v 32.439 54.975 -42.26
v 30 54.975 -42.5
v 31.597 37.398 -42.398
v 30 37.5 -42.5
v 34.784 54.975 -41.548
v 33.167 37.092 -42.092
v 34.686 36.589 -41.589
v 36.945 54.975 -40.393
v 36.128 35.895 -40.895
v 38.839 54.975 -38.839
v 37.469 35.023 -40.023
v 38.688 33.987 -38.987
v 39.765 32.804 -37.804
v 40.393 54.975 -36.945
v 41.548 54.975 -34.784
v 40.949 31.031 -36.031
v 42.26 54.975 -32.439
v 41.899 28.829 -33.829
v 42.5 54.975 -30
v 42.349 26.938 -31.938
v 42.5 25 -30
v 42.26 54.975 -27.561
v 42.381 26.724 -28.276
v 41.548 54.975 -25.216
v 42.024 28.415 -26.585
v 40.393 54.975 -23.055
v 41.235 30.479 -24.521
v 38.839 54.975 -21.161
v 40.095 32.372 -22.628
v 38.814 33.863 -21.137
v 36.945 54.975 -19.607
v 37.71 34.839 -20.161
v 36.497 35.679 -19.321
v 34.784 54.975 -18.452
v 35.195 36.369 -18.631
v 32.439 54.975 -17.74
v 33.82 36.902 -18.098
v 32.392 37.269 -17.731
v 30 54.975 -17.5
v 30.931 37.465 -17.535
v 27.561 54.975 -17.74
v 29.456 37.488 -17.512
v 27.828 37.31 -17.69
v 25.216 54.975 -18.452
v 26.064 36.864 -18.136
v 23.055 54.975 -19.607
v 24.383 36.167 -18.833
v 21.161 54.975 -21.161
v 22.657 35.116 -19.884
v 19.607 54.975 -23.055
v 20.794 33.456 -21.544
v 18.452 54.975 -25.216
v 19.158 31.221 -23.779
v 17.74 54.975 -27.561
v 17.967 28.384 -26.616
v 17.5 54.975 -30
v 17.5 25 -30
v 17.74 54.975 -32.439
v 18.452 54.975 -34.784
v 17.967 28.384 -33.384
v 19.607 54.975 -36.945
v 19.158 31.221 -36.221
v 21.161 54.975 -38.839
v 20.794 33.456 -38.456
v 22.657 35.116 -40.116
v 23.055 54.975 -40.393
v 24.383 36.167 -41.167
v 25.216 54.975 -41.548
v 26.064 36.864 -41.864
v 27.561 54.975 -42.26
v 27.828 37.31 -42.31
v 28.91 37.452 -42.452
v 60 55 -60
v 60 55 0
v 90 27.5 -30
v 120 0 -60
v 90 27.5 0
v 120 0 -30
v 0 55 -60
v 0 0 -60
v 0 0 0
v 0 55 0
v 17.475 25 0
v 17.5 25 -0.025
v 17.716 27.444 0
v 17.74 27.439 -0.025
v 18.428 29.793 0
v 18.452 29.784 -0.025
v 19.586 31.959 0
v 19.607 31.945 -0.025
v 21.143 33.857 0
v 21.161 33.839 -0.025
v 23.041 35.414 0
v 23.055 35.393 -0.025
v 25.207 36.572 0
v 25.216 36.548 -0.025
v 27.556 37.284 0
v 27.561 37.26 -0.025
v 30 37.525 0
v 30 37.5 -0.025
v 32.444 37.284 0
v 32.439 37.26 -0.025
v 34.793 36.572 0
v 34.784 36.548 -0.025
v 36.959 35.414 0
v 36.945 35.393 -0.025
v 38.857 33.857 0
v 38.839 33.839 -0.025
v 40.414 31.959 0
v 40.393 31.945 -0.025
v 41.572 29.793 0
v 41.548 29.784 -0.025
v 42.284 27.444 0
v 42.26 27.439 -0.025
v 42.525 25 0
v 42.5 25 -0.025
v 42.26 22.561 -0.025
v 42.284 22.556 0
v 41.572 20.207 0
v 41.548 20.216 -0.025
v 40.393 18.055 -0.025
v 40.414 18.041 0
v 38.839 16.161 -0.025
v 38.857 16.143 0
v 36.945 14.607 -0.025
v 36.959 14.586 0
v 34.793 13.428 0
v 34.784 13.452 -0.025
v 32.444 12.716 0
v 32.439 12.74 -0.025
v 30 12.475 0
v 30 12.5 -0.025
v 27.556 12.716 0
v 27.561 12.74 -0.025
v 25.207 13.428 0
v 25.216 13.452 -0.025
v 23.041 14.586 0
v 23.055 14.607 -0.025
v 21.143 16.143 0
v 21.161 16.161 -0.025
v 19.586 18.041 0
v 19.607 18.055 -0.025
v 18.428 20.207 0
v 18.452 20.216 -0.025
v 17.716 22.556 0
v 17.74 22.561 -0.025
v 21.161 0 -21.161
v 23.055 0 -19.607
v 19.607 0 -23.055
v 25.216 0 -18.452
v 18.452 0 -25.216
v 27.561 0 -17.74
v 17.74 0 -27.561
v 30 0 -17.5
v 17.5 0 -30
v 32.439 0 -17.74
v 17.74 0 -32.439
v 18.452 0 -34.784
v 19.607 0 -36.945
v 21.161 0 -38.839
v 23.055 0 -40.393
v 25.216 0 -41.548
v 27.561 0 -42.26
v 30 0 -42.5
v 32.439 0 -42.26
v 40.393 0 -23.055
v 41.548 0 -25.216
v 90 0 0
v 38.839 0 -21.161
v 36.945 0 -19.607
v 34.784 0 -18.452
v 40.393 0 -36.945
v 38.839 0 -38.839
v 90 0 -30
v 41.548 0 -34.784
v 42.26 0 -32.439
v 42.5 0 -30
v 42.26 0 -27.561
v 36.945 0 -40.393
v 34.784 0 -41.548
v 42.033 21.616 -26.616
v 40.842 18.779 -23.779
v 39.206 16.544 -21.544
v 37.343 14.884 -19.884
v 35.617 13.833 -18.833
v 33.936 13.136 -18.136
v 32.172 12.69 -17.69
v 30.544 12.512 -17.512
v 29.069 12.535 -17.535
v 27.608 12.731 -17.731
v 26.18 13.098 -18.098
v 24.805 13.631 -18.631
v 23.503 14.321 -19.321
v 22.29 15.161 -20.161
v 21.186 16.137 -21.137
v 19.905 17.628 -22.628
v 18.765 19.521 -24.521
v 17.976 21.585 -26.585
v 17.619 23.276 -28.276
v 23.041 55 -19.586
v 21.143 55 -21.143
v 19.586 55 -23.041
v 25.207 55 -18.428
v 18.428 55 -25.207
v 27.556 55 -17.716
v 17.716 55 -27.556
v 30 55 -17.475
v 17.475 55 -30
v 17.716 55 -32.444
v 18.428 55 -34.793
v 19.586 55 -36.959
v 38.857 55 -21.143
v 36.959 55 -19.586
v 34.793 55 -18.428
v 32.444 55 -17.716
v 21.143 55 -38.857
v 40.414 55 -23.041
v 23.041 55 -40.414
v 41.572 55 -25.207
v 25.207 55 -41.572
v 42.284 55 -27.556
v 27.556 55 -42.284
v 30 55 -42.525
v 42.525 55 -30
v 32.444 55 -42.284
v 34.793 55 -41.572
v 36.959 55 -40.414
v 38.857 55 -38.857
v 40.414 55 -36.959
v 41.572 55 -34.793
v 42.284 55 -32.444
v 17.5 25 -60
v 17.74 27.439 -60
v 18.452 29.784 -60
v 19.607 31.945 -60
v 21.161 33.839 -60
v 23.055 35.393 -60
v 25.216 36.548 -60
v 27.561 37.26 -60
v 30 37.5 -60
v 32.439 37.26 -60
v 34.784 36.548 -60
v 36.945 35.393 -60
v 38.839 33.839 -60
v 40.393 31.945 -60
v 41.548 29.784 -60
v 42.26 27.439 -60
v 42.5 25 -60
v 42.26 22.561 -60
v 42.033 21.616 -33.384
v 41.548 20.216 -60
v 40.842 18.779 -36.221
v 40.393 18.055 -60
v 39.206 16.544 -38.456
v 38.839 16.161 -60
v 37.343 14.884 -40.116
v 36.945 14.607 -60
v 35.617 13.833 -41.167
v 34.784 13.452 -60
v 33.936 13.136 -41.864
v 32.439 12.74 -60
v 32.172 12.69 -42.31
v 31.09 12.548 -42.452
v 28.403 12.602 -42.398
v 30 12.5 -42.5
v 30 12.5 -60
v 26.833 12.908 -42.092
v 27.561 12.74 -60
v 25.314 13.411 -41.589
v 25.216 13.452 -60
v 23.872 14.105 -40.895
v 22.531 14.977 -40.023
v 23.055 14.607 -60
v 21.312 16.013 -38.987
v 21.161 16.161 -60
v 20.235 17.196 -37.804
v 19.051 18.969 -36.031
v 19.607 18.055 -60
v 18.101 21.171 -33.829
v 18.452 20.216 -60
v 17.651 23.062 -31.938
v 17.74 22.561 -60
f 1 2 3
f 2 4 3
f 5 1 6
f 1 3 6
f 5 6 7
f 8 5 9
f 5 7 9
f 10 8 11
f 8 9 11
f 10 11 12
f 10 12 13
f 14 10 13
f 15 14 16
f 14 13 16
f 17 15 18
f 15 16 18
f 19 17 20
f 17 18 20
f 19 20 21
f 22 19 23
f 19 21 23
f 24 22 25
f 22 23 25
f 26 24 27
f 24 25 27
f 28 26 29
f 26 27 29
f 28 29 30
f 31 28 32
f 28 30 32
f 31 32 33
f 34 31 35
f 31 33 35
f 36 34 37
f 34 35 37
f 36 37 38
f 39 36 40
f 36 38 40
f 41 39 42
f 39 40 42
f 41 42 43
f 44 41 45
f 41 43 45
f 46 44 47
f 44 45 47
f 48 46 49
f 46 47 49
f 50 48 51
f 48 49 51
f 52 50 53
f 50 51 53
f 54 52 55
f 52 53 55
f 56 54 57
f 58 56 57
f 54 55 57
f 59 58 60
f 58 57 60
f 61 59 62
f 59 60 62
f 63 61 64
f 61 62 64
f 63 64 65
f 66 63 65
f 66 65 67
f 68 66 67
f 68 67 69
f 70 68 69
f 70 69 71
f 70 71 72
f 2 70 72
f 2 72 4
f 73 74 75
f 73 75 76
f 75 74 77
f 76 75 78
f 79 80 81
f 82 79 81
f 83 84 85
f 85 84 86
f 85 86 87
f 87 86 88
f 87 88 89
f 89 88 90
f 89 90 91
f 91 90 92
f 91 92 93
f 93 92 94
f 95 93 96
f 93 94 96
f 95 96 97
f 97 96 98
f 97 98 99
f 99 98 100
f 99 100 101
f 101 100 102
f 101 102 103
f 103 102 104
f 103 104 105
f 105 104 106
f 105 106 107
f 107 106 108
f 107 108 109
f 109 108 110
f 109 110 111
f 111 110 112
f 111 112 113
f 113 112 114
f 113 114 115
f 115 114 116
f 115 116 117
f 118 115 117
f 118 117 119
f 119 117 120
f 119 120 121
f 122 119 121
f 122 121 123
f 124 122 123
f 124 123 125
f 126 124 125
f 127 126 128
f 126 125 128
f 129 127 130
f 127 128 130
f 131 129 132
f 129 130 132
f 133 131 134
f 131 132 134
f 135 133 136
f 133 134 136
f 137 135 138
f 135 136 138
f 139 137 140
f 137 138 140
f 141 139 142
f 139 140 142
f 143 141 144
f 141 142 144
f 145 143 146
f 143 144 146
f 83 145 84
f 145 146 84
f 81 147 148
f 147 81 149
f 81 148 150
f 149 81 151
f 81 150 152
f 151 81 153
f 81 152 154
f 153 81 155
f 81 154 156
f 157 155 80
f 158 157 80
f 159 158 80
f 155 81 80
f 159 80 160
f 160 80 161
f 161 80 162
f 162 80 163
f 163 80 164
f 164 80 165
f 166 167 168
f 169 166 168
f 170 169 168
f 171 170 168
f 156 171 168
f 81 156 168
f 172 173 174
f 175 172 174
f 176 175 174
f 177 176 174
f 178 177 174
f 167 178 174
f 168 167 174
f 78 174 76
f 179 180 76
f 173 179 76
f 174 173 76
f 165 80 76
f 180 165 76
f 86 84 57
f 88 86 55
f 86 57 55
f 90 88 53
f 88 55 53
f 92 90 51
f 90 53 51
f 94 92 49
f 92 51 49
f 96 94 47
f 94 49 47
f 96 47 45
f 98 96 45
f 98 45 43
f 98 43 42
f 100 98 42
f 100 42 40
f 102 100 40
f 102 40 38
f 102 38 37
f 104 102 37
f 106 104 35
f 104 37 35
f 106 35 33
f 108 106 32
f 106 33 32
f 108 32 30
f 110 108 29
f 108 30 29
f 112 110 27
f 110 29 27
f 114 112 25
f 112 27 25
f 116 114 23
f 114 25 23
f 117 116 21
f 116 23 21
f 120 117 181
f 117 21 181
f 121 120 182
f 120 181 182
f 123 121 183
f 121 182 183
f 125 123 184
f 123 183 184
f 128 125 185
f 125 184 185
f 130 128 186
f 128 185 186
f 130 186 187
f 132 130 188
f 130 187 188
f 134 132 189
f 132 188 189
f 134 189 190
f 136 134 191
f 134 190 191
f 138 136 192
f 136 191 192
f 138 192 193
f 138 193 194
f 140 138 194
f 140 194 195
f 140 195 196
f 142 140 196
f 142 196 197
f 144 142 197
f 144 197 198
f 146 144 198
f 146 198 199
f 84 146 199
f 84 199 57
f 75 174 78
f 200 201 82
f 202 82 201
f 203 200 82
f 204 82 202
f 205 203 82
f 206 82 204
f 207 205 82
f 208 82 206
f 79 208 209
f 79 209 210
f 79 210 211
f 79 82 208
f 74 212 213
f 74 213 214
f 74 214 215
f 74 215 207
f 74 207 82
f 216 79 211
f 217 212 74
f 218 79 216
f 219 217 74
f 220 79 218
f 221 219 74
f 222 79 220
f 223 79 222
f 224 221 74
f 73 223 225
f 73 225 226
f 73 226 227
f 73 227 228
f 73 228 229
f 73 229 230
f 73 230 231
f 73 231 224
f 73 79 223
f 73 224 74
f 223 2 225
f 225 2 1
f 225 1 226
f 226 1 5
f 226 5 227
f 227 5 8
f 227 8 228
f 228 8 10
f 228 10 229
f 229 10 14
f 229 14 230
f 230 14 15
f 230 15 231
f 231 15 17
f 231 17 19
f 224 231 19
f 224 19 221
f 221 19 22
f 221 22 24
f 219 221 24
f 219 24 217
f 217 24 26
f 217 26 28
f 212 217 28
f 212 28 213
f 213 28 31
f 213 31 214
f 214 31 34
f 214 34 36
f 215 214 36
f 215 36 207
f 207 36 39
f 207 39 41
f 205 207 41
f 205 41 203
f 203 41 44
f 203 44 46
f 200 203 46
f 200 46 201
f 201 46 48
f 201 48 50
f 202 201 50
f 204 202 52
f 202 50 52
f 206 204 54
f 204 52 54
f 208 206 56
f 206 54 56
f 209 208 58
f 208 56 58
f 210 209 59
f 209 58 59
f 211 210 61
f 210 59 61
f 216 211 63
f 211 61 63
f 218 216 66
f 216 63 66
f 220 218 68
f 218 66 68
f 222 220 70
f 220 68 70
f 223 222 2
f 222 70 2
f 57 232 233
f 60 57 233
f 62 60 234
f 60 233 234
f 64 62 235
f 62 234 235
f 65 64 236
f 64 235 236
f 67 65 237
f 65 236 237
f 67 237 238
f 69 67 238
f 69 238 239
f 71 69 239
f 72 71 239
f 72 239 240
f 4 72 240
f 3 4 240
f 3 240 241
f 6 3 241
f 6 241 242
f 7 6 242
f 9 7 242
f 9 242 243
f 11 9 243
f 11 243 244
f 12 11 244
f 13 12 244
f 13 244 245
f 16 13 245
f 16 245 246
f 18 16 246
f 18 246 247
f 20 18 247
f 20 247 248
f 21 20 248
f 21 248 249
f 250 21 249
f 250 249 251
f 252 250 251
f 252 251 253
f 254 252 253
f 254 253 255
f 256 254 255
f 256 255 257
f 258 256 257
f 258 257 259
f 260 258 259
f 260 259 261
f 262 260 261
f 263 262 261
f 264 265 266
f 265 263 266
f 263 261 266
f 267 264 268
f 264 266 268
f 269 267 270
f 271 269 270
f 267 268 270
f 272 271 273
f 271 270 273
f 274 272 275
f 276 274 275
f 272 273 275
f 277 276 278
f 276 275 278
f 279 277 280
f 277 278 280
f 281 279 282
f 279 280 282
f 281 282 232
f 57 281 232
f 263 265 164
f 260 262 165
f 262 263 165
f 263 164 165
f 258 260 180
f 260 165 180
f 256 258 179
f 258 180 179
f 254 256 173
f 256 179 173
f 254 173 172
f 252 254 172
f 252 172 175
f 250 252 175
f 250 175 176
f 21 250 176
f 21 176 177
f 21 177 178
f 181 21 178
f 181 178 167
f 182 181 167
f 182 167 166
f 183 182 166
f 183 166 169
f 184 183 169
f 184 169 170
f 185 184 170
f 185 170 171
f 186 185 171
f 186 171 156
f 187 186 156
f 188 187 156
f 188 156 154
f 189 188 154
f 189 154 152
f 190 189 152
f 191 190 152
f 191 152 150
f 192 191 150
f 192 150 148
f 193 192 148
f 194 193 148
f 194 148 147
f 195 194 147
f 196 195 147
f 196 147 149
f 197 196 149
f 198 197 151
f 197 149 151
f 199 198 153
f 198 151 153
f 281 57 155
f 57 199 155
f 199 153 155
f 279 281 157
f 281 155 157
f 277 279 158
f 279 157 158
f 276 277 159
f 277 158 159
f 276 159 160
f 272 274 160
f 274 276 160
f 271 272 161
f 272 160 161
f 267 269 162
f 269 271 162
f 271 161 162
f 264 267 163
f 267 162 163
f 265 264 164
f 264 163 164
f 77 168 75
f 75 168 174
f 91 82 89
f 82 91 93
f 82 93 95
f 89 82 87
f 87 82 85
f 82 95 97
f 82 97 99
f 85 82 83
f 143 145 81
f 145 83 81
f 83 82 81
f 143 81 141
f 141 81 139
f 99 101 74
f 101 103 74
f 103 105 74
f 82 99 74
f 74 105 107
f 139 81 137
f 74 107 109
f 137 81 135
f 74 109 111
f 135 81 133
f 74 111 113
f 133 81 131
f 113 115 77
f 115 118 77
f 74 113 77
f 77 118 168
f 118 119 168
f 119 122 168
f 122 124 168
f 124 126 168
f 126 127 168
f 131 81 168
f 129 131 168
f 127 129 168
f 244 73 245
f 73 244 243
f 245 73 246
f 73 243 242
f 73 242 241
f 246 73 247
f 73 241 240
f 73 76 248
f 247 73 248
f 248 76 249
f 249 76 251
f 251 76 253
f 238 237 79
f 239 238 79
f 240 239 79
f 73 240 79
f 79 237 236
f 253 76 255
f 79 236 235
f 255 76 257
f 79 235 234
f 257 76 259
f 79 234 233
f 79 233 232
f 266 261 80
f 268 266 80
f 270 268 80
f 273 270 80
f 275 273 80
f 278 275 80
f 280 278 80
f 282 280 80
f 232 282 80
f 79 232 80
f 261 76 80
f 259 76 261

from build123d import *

# Parameters (mm, degrees)
BOSS_EXTRUDE1_DEPTH                  = 55
CUT_EXTRUDE2_DEPTH                   = 146
F_25_0_25_DIAMETER_HOLE3_D           = 25
F_25_0_25_DIAMETER_HOLE3_CSINK_D     = 25.05
F_25_0_25_DIAMETER_HOLE3_CSINK_ANGLE = 90
F_25_0_25_DIAMETER_HOLE4_D           = 25
F_25_0_25_DIAMETER_HOLE4_CSINK_D     = 25.05
F_25_0_25_DIAMETER_HOLE4_CSINK_ANGLE = 90


with BuildPart() as part:
    # Sketch1 → Boss-Extrude1 (new body)
    with BuildSketch(Plane(origin=(0, 0, 0), x_dir=(1, 0, 0), z_dir=(0, 1, 0))):
        Polygon((0, 0), (90, 0), (90, 30), (120, 30), (120, 60), (102.487310381, 60), (0, 60), align=None)
    extrude(amount=BOSS_EXTRUDE1_DEPTH)

    # Sketch4 → Cut-Extrude2 (cut, through all)
    with BuildSketch(Plane.XY):
        Polygon((60, 55), (120, 0), (120, 55), align=None)
    extrude(amount=-CUT_EXTRUDE2_DEPTH, mode=Mode.SUBTRACT)

    # Ø25.0 (25) Diameter Hole3 (through all)
    with Locations(Plane(origin=(30, 25, 0), x_dir=(1, 0, 0), z_dir=(0, 0, 1))):
        with Locations((0, 0)):
            CounterSinkHole(F_25_0_25_DIAMETER_HOLE3_D / 2, F_25_0_25_DIAMETER_HOLE3_CSINK_D / 2, counter_sink_angle=F_25_0_25_DIAMETER_HOLE3_CSINK_ANGLE)

    # Ø25.0 (25) Diameter Hole4 (through all)
    with Locations(Plane(origin=(30, 55, -30), x_dir=(0, 0, 1), z_dir=(0, 1, 0))):
        with Locations((0, 0)):
            CounterSinkHole(F_25_0_25_DIAMETER_HOLE4_D / 2, F_25_0_25_DIAMETER_HOLE4_CSINK_D / 2, counter_sink_angle=F_25_0_25_DIAMETER_HOLE4_CSINK_ANGLE)


solid = part.part
